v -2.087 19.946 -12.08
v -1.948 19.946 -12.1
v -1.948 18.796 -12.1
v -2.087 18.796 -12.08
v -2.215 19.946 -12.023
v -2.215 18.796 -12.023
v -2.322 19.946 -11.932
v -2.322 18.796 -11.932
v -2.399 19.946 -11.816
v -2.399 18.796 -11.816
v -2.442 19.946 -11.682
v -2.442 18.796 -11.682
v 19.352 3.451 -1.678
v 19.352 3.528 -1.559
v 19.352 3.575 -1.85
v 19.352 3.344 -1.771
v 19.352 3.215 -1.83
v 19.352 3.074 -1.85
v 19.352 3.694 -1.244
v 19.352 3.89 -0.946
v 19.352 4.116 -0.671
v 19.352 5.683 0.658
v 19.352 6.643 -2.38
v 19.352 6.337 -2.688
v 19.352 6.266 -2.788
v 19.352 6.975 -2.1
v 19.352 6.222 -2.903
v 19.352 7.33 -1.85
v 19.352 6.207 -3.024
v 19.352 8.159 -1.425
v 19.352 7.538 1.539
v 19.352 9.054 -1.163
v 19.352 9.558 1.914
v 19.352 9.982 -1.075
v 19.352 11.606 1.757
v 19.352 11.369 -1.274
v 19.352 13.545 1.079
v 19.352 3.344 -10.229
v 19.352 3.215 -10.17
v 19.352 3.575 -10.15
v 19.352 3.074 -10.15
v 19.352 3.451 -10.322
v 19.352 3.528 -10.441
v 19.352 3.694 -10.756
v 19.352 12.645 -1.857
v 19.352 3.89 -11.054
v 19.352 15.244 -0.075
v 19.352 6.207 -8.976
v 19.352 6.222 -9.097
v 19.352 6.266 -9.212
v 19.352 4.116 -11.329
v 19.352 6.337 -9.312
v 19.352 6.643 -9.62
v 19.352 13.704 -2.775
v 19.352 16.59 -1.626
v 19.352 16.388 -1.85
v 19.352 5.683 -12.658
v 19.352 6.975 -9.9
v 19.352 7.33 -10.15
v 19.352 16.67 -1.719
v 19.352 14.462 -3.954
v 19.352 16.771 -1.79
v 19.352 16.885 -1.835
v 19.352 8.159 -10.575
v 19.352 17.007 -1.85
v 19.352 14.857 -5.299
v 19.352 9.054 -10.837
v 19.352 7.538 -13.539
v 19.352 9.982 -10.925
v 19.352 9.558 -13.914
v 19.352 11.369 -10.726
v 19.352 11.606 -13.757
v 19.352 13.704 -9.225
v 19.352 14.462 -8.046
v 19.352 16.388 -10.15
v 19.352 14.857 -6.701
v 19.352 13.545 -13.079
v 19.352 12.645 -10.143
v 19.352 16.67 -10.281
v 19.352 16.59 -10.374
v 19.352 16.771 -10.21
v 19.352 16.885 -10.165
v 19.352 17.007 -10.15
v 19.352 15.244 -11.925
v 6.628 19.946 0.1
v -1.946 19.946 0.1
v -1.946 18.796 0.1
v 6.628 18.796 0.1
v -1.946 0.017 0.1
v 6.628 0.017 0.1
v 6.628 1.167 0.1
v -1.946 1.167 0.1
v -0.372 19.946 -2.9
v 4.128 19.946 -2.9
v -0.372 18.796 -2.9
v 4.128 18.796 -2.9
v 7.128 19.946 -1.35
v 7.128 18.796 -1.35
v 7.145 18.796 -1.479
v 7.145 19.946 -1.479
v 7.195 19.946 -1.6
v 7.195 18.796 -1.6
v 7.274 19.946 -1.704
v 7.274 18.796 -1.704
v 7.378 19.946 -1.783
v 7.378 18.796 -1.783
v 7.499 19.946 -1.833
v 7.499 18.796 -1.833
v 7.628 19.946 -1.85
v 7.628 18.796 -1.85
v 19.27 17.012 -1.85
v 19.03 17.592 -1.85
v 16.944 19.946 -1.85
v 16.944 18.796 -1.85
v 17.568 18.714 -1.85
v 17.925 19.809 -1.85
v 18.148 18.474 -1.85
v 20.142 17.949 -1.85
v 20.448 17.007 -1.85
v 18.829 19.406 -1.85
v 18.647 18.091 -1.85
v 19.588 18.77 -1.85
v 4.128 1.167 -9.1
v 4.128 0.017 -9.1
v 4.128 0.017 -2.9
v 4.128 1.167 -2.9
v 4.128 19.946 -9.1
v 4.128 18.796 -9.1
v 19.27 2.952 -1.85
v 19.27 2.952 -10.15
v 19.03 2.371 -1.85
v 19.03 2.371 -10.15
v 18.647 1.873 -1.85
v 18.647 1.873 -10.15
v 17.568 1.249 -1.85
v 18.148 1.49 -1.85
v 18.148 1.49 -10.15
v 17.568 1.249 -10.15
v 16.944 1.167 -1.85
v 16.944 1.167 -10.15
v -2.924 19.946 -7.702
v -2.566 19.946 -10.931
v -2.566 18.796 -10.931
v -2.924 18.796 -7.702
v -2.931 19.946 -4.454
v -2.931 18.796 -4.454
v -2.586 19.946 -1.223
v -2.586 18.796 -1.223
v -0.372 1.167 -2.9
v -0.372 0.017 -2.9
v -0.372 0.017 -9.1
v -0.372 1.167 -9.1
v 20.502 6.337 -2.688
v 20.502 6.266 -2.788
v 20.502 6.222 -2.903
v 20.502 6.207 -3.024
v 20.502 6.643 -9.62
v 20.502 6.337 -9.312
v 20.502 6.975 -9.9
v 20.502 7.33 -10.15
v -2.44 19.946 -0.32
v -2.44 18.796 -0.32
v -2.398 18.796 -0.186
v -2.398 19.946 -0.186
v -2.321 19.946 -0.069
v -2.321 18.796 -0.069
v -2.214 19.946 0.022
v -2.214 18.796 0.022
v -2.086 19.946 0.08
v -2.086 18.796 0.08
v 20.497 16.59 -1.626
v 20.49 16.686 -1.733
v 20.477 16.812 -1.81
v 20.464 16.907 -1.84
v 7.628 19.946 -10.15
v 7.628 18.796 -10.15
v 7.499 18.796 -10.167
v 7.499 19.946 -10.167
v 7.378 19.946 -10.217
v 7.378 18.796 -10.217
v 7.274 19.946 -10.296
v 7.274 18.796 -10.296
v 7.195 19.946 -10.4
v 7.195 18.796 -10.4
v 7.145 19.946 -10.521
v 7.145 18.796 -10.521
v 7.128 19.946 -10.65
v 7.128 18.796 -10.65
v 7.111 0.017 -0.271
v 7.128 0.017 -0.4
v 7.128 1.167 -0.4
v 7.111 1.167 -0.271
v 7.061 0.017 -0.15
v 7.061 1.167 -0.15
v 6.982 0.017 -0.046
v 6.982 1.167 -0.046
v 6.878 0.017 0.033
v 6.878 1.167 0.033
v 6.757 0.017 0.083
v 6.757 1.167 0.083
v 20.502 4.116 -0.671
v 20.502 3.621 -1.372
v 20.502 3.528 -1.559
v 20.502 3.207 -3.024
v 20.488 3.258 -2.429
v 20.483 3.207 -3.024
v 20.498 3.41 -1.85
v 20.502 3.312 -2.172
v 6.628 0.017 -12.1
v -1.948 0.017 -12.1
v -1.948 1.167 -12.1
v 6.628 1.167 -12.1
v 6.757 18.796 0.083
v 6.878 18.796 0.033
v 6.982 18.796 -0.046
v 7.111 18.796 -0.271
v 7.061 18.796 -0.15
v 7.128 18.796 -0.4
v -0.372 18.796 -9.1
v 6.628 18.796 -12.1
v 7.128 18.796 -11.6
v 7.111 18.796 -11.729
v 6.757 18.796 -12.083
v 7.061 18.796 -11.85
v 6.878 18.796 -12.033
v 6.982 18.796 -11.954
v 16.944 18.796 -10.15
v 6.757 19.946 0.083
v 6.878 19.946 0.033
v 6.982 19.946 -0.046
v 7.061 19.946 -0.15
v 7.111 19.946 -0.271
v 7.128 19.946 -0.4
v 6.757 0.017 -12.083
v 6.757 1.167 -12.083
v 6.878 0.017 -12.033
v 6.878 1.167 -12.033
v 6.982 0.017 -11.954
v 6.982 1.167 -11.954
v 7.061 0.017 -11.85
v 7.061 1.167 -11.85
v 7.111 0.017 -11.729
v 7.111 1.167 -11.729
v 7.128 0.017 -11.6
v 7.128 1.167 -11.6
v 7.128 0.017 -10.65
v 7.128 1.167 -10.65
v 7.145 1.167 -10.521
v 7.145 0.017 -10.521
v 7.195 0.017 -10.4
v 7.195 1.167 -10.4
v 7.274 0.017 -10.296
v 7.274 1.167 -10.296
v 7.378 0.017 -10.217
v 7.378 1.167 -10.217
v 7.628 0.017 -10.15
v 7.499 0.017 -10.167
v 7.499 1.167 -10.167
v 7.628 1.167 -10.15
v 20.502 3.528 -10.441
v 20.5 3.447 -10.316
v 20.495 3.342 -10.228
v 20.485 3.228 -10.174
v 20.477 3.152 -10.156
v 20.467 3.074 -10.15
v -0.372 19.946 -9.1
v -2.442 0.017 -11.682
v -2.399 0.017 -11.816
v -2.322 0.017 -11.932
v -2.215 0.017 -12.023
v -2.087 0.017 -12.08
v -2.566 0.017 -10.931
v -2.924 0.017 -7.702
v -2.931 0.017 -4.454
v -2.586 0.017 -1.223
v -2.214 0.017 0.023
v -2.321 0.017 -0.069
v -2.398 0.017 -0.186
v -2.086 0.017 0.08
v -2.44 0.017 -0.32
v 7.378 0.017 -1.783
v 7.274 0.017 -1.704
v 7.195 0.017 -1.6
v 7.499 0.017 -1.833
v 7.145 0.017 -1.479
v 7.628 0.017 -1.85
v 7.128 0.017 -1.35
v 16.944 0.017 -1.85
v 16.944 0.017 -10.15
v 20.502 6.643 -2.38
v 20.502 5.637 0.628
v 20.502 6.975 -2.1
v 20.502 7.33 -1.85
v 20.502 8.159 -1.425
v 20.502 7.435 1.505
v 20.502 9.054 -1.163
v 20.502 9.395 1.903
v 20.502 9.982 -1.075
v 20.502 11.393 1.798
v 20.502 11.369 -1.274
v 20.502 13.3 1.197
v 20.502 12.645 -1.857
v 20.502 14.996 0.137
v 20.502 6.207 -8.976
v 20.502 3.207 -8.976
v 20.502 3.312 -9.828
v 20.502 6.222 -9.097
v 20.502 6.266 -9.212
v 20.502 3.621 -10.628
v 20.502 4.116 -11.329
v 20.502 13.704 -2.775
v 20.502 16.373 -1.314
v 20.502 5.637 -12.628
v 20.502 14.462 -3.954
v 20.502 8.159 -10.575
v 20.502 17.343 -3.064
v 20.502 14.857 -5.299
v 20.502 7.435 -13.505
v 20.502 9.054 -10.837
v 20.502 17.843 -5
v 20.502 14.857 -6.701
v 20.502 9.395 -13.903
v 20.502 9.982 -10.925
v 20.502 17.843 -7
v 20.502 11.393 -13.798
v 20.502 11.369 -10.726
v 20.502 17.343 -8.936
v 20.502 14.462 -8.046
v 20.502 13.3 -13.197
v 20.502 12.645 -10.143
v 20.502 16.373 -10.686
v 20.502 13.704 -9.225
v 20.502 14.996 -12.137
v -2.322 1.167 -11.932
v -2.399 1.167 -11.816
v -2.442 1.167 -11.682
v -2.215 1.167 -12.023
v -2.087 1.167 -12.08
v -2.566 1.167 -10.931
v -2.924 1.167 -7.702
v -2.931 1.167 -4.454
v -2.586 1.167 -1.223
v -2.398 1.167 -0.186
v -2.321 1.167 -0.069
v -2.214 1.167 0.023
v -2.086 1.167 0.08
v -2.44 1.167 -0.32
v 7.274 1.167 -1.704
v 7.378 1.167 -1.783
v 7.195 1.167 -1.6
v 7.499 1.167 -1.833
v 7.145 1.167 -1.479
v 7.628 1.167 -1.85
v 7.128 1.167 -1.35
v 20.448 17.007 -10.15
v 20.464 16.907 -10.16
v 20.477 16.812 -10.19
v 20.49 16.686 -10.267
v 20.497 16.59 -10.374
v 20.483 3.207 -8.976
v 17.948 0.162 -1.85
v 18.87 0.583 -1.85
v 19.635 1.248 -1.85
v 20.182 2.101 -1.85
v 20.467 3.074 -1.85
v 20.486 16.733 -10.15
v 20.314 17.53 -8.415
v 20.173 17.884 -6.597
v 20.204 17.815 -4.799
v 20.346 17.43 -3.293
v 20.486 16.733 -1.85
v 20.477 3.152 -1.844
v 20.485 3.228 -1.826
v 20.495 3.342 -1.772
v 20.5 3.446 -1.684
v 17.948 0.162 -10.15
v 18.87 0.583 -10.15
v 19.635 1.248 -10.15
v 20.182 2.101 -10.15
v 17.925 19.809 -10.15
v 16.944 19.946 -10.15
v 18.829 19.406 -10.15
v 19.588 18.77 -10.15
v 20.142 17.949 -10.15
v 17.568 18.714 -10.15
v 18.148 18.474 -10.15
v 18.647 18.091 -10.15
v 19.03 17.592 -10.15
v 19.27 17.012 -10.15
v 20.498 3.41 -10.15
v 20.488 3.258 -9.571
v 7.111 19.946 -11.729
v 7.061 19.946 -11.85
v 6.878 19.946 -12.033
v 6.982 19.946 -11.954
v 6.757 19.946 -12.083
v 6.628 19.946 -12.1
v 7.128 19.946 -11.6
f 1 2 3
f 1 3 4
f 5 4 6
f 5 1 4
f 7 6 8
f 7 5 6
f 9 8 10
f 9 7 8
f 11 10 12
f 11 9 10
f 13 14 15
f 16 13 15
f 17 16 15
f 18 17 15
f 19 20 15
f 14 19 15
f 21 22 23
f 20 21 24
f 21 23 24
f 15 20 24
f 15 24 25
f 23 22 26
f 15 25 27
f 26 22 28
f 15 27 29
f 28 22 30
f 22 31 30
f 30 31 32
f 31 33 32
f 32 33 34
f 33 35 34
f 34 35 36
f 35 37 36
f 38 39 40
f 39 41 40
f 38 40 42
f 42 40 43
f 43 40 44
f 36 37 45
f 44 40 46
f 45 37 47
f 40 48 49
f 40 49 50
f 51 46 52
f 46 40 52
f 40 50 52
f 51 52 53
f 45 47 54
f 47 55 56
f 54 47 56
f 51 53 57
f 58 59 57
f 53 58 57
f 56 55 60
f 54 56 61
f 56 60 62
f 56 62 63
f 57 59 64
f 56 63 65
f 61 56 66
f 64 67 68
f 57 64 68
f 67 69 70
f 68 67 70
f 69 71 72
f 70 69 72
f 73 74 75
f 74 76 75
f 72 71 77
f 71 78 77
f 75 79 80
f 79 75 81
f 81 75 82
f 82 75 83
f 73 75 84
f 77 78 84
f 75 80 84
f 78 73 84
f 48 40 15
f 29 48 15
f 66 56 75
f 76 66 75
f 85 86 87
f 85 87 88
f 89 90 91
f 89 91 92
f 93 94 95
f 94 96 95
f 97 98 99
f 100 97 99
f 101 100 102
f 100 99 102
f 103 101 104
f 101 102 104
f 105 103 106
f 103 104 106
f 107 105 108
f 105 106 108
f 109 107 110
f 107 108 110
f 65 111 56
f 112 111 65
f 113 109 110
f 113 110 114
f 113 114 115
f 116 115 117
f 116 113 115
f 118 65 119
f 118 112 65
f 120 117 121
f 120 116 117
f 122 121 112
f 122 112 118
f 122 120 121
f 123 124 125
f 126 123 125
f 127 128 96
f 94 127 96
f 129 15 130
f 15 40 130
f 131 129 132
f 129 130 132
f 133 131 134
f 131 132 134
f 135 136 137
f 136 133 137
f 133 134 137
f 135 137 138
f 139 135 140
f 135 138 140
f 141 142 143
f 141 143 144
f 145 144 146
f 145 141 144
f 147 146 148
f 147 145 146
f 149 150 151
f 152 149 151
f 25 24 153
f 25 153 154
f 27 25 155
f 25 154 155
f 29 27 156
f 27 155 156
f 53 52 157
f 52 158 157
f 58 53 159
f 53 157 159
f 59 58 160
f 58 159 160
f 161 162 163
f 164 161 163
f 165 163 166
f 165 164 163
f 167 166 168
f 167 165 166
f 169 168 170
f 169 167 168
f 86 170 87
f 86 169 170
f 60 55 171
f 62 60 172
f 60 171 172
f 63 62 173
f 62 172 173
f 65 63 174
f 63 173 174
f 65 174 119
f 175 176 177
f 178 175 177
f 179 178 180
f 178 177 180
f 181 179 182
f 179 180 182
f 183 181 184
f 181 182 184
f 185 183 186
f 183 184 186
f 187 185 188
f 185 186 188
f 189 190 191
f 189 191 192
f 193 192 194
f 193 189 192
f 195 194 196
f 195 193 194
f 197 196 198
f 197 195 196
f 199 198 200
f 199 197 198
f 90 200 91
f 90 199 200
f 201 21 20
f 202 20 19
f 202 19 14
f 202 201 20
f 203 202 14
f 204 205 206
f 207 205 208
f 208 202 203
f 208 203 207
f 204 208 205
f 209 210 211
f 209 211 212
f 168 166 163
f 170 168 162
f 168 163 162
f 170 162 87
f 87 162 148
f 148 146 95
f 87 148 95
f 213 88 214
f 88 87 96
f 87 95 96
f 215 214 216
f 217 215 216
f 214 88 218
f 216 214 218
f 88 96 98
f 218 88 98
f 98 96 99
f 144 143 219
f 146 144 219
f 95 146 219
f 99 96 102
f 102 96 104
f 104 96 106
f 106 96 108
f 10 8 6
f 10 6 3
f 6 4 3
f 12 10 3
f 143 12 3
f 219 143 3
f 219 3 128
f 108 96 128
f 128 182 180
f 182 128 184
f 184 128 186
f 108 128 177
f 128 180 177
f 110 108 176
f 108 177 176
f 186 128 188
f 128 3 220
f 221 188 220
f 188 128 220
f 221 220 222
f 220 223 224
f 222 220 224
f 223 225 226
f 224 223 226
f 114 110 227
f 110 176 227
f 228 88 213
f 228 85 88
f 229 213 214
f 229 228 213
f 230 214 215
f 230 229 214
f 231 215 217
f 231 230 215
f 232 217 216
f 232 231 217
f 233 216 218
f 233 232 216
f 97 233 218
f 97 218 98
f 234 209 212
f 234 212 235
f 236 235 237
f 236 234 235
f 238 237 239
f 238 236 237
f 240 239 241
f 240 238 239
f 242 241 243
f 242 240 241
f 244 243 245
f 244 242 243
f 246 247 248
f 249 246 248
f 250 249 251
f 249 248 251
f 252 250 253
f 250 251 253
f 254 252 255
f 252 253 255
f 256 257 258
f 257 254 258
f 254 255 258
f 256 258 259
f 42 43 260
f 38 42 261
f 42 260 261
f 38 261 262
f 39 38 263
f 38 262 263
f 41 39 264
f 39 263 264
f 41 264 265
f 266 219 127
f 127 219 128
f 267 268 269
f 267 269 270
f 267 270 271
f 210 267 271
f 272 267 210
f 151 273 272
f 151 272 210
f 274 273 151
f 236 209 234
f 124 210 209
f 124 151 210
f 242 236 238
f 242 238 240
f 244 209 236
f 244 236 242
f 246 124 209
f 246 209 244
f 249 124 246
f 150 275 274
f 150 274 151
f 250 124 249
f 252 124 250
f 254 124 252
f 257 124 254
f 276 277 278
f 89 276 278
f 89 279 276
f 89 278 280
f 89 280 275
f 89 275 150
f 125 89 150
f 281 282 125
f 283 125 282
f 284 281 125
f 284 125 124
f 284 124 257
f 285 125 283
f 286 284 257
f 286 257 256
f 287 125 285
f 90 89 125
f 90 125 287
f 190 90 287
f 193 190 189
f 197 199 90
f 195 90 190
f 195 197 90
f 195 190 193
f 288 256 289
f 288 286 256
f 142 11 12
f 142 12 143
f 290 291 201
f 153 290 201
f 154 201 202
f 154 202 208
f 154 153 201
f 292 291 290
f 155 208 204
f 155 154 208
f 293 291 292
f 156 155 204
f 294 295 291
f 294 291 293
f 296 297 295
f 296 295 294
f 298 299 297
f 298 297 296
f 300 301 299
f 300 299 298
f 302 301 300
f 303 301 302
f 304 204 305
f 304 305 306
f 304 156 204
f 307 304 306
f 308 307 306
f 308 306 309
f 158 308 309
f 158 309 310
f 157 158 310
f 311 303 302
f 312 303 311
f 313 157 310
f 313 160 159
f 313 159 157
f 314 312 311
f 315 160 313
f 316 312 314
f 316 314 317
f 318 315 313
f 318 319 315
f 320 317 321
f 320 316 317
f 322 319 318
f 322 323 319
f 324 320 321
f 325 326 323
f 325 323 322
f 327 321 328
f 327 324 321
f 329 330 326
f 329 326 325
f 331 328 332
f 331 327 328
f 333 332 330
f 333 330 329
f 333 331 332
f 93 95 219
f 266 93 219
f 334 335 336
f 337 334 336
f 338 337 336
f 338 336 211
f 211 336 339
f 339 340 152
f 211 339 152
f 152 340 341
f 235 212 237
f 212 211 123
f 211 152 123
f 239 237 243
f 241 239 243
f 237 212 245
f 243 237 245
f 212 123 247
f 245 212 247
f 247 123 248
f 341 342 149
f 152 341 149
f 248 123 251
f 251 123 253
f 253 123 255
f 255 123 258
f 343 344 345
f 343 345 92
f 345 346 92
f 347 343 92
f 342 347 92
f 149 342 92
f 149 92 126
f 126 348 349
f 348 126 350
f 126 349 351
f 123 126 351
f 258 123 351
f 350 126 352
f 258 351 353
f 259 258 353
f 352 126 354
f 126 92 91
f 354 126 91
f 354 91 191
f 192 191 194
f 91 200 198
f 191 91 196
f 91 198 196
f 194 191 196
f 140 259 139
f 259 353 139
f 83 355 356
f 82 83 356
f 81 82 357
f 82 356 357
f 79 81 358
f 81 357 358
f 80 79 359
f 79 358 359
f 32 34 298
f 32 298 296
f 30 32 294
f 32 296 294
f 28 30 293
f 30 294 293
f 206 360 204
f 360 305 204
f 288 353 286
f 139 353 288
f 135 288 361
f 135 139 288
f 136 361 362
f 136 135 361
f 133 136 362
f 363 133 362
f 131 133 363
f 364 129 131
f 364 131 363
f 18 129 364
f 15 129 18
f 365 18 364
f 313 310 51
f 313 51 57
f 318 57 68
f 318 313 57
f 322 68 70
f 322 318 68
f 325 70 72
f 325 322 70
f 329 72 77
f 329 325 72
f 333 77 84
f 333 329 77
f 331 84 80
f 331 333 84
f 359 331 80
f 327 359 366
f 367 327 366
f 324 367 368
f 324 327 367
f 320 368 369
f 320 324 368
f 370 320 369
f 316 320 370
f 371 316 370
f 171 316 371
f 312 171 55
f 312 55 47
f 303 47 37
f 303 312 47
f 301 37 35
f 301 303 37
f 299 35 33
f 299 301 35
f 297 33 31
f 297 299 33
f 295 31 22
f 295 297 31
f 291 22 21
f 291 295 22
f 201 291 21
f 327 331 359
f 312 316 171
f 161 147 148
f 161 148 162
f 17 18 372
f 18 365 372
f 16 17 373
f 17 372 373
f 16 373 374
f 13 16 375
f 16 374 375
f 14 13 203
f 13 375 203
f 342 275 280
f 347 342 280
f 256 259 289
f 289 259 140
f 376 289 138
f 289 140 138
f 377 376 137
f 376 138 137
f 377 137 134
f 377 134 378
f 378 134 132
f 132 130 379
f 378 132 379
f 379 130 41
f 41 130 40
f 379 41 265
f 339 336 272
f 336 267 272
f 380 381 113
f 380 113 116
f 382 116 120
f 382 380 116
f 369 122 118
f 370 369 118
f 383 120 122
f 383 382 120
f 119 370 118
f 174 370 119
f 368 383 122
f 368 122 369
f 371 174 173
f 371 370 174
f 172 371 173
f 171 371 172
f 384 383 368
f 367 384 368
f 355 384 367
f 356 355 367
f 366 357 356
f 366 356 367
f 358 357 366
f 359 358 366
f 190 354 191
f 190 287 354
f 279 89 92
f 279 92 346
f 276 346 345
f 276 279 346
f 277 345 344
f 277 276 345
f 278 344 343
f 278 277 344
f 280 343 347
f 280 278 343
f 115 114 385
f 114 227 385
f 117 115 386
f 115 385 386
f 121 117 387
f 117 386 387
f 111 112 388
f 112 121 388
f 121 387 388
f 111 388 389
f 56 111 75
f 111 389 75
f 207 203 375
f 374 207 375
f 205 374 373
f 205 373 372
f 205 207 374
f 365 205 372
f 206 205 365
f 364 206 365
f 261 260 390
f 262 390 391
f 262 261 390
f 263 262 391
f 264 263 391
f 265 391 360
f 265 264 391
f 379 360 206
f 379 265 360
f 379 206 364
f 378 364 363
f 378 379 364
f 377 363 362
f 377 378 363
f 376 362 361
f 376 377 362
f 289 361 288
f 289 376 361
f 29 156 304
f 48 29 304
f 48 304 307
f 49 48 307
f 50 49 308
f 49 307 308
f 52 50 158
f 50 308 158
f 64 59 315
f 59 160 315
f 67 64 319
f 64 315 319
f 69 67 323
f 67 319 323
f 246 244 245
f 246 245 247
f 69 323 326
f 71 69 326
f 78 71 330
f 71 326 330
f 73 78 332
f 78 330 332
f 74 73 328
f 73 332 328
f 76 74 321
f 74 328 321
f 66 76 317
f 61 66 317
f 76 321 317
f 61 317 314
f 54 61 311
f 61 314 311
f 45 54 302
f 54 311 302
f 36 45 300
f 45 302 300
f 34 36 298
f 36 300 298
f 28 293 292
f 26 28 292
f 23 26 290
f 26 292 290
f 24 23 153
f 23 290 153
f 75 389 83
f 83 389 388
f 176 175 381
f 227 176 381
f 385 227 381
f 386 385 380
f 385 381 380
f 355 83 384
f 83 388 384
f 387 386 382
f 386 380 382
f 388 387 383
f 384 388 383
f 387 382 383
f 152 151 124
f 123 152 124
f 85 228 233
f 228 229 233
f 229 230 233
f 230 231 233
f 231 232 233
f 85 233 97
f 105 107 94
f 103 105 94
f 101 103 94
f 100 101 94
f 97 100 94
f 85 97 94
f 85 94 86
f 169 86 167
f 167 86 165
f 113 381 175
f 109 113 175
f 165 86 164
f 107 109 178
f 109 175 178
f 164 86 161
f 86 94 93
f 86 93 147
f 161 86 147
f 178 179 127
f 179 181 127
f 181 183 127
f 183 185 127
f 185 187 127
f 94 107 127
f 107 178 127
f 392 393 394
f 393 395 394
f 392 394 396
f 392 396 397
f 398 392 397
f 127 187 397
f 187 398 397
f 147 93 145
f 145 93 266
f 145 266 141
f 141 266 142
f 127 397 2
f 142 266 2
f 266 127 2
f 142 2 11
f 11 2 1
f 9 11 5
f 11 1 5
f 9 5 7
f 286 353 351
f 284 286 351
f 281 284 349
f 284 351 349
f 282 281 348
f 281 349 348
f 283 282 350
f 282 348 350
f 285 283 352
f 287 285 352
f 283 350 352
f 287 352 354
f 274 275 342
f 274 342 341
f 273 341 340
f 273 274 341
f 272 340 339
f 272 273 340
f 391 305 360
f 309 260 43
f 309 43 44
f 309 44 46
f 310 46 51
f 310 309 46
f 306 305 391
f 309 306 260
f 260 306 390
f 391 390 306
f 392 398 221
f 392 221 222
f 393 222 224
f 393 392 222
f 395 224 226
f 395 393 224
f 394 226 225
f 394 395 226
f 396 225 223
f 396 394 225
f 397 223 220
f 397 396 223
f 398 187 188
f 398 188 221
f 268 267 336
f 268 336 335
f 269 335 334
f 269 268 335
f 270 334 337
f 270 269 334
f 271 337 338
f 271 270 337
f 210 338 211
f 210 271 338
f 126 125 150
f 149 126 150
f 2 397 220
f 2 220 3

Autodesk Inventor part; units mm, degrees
ref_plane "YZ Plane" through (0, 0, 0) normal (1, 0, 0) x (0, 1, 0)
ref_plane "XZ Plane" through (0, 0, 0) normal (0, 1, 0) x (-1, 0, 0)
ref_plane "XY Plane" through (0, 0, 0) normal (0, 0, 1) x (1, 0, 0)
ref_plane "Work Plane1" through (0, 0, -6) normal (0, 0, 1) x (1, 0, 0)
sketch "Sketch2" plane through (0, 0, -6) normal (0, 0, 1) x (1, 0, 0)
  line L0 (-0.1721, 1.3319) -> (-0.1721, -0.6681) projected
  line L1 (-0.1721, -0.6681) -> (-1.1721, -0.6681) projected
  line L2 (-1.1721, -0.6681) -> (-1.1721, -1.1681) projected
  line L3 (-1.1721, -1.1681) -> (0.1026, -1.1681) projected
  line L4 (0.1026, -1.1681) -> (1.1279, 1.3319) projected
  line L5 (-0.1721, 1.3319) -> (1.1279, 1.3319) projected
  line L6 (21.2279, 14.4069) -> (21.2279, 6.7069) projected
  line L7 (22.1279, 8.9819) -> (22.1279, 10.9819) projected
  line L8 (-1.5666, 1.1673) -> (16.9443, 1.1673)
  arc A0 (16.9443, 1.1673) -> (19.3523, 3.5752) centre (16.9443, 3.5752) ccw
  line L9 (19.3523, 3.5752) -> (19.3523, 9.9819)
  line L10 (20.5023, 9.9819) -> (20.5023, 3.5752)
  arc A1 (16.9443, 0.0173) -> (20.5023, 3.5752) centre (16.9443, 3.5752) ccw
  line L11 (16.9443, 0.0173) -> (-1.5666, 0.0173)
  line L12 (-1.5666, 0.0173) -> (-1.5666, 1.1673)
  line L13 (20.5023, 9.9819) -> (19.3523, 9.9819)
  line L14 (-1.5666, 18.7964) -> (16.9443, 18.7964)
  arc A2 (19.3523, 16.3885) -> (16.9443, 18.7964) centre (16.9443, 16.3885) ccw
  line L15 (19.3523, 16.3885) -> (19.3523, 9.9819)
  line L16 (20.5023, 9.9819) -> (20.5023, 16.3885)
  arc A3 (20.5023, 16.3885) -> (16.9443, 19.9464) centre (16.9443, 16.3885) ccw
  line L17 (16.9443, 19.9464) -> (-1.5666, 19.9464)
  line L18 (-1.5666, 19.9464) -> (-1.5666, 18.7964)
  point P0 (0, 0)
  point P1 (22.1279, 9.9819)
  dimension "d1" = 1.15
  dimension "d2" = 0.7257
extrude "Extrusion1" add sketch "Sketch2" along normal mid plane 8.3 contours L8 L4 L11 L0 | L0 L11 L12 L8 | L8 A0 L9 L13 L10 A1 L11 L4 | L15 A2 L14 L18 L17 A3 L16 L13
sketch "Sketch3" plane through (20.5023, 3.5752, -1.85) normal (1, 0, 0) x (0, 0, -1)
  line L0 (1.1743, 2.6316) -> (7.1257, 2.6316) projected
  line L1 (1.1743, 2.6316) -> (7.1257, 2.6316) projected
  arc A0 (0.838, 2.7615) -> (1.1743, 2.6316) centre (1.1743, 3.1316) ccw projected
  arc A1 (7.462, 2.7615) -> (0.838, 2.7615) centre (4.15, 6.4066) ccw projected
  arc A2 (7.1257, 2.6316) -> (7.462, 2.7615) centre (7.1257, 3.1316) ccw projected
  line L2 (1.1743, 2.6316) -> (7.1257, 2.6316) projected
  arc A3 (-1.1794, 0.5412) -> (1.1743, -0.3684) centre (1.1743, 3.1316) ccw
  arc A4 (9.4794, 0.5412) -> (-1.1794, 0.5412) centre (4.15, 6.4066) ccw
  arc A5 (7.1257, -0.3684) -> (9.4794, 0.5412) centre (7.1257, 3.1316) ccw
  line L3 (7.1257, -0.3684) -> (1.1743, -0.3684)
  point P0 (-1.85, -3.5752)
  dimension "d5" = 3
extrude "Extrusion2" add sketch "Sketch3" against normal blind 1.15
sketch "Sketch4" plane through (20.5023, 9.9819, -6) normal (1, 0, 0) x (0, 0, -1)
  line L0 (-2.9757, -3.775) -> (2.9757, -3.775) projected
  line L1 (-2.9757, -3.775) -> (2.9757, -3.775) projected
  arc A0 (-3.312, -3.6451) -> (-2.9757, -3.775) centre (-2.9757, -3.275) ccw projected
  arc A1 (3.312, -3.6451) -> (-3.312, -3.6451) centre (0, 0) ccw projected
  arc A2 (2.9757, -3.775) -> (3.312, -3.6451) centre (2.9757, -3.275) ccw projected
  point P0 (-6, -9.9819)
extrude "Extrusion3" cut sketch "Sketch4" against normal blind 1.5
fillet "Fillet1" radius 0.5 4 edges at (19.9253, 3.4097, -1.85) (19.9253, 3.4097, -10.15) (19.9189, 16.7334, -10.15) (19.9189, 16.7334, -1.85)
sketch "Sketch5" plane through (-1.5666, 0.0173, -1.85) normal (0, -1, 0) x (1, 0, 0)
  line L0 (1.3946, -7.15) -> (1.3946, -1.15) projected
  line L1 (1.3946, -1.15) -> (1.3946, -7.15) projected
  line L2 (1.6693, -1.15) -> (2.6946, -1.15) projected
  line L3 (1.6693, -1.15) -> (1.6693, -7.15) projected
  line L4 (1.6693, -7.15) -> (2.6946, -7.15) projected
  line L5 (2.6946, -1.15) -> (2.6946, -7.15) projected
  line L6 (1.1946, -7.25) -> (5.6946, -7.25)
  line L7 (5.6946, -7.25) -> (5.6946, -1.05)
  line L8 (5.6946, -1.05) -> (1.1946, -1.05)
  line L9 (1.1946, -1.05) -> (1.1946, -7.25)
  point P0 (1.5666, 1.85)
  dimension "d12" = 0.1
  dimension "d13" = 0.1
  dimension "d14" = 3
  dimension "d15" = 0.2
extrude "Extrusion4" cut sketch "Sketch5" against normal blind 22.75 contours L2 L5 L4 L3 | L9 L8 L7 L6
sketch "Sketch6" plane through (-1.5666, 0.0173, -1.85) normal (0, -1, 0) x (1, 0, 0)
  line L0 (-0.3816, -10.25) -> (8.1946, -10.25)
  line L1 (8.6946, -9.75) -> (8.6946, 1.45)
  line L2 (8.1946, 1.95) -> (-0.3799, 1.95)
  line L3 (-0.8749, -9.8319) -> (-0.9996, -9.0812)
  line L4 (-1.0196, 0.6268) -> (-0.8734, 1.5299)
  line L5 (1.1946, -1.05) -> (5.6946, -1.05) projected
  line L6 (5.6946, -7.25) -> (1.1946, -7.25) projected
  line L7 (5.6946, -1.05) -> (5.6946, -7.25) projected
  line L8 (1.1946, -7.25) -> (1.1946, -1.05) projected
  arc A0 (-1.0196, 0.6268) -> (-0.9996, -9.0812) centre (28.5951, -4.1661) ccw
  arc A1 (-0.8749, -9.8319) -> (-0.3816, -10.25) centre (-0.3816, -9.75) ccw
  arc A2 (-0.3799, 1.95) -> (-0.8734, 1.5299) centre (-0.3799, 1.45) ccw
  arc A3 (8.6946, 1.45) -> (8.1946, 1.95) centre (8.1946, 1.45) ccw
  arc A4 (8.1946, -10.25) -> (8.6946, -9.75) centre (8.1946, -9.75) ccw
  point P0 (1.5666, 1.85)
  point P1 (-0.8054, -10.25)
  point P2 (-0.8054, 1.95)
  point P3 (-1.8054, -4.2289)
  dimension "d18" = 3
  dimension "d19" = 3
  dimension "d20" = 3
  dimension "d21" = 3
  dimension "d22" = 2
  dimension "d23" = 30
  dimension "d24" = 0.5
extrude "Extrusion5" add sketch "Sketch6" against normal blind 1.15
sketch "Sketch7" plane through (-1.5666, 19.9464, -1.85) normal (0, 1, 0) x (1, 0, 0)
  line L0 (5.6946, 1.05) -> (5.6946, 7.25) projected
  line L1 (5.6946, 7.25) -> (1.1946, 7.25) projected
  line L2 (1.1946, 7.25) -> (1.1946, 1.05) projected
  line L3 (1.1946, 1.05) -> (5.6946, 1.05) projected
  line L4 (18.5109, 8.3) -> (8.6946, 8.3) projected
  line L5 (18.5109, 8.3) -> (18.5109, 0) projected
  line L6 (8.6946, 0) -> (18.5109, 0) projected
  line L7 (8.6946, -1.45) -> (8.6946, 0) projected
  arc A0 (8.1946, -1.95) -> (8.6946, -1.45) centre (8.1946, -1.45) ccw projected
  line L8 (-0.3799, -1.95) -> (8.1946, -1.95) projected
  arc A1 (-0.8734, -1.5299) -> (-0.3799, -1.95) centre (-0.3799, -1.45) ccw projected
  line L9 (-1.0196, -0.6268) -> (-0.8734, -1.5299) projected
  arc A2 (-0.9996, 9.0812) -> (-1.0196, -0.6268) centre (28.5951, 4.1661) ccw projected
  line L10 (-0.8749, 9.8319) -> (-0.9996, 9.0812) projected
  arc A3 (-0.3816, 10.25) -> (-0.8749, 9.8319) centre (-0.3816, 9.75) ccw projected
  line L11 (8.1946, 10.25) -> (-0.3816, 10.25) projected
  arc A4 (8.6946, 9.75) -> (8.1946, 10.25) centre (8.1946, 9.75) ccw projected
  line L12 (8.6946, 8.3) -> (8.6946, 9.75) projected
  point P0 (1.5666, -1.85)
extrude "Extrusion6" add sketch "Sketch7" against normal blind 1.15
fillet "Fillet2" radius 0.5 4 edges at (7.1279, 19.3714, -1.85) (7.1279, 0.5923, -1.85) (7.1279, 19.3714, -10.15) (7.1279, 0.5923, -10.15)
properties part number "Part3 - Gearbox" material "Glass"
